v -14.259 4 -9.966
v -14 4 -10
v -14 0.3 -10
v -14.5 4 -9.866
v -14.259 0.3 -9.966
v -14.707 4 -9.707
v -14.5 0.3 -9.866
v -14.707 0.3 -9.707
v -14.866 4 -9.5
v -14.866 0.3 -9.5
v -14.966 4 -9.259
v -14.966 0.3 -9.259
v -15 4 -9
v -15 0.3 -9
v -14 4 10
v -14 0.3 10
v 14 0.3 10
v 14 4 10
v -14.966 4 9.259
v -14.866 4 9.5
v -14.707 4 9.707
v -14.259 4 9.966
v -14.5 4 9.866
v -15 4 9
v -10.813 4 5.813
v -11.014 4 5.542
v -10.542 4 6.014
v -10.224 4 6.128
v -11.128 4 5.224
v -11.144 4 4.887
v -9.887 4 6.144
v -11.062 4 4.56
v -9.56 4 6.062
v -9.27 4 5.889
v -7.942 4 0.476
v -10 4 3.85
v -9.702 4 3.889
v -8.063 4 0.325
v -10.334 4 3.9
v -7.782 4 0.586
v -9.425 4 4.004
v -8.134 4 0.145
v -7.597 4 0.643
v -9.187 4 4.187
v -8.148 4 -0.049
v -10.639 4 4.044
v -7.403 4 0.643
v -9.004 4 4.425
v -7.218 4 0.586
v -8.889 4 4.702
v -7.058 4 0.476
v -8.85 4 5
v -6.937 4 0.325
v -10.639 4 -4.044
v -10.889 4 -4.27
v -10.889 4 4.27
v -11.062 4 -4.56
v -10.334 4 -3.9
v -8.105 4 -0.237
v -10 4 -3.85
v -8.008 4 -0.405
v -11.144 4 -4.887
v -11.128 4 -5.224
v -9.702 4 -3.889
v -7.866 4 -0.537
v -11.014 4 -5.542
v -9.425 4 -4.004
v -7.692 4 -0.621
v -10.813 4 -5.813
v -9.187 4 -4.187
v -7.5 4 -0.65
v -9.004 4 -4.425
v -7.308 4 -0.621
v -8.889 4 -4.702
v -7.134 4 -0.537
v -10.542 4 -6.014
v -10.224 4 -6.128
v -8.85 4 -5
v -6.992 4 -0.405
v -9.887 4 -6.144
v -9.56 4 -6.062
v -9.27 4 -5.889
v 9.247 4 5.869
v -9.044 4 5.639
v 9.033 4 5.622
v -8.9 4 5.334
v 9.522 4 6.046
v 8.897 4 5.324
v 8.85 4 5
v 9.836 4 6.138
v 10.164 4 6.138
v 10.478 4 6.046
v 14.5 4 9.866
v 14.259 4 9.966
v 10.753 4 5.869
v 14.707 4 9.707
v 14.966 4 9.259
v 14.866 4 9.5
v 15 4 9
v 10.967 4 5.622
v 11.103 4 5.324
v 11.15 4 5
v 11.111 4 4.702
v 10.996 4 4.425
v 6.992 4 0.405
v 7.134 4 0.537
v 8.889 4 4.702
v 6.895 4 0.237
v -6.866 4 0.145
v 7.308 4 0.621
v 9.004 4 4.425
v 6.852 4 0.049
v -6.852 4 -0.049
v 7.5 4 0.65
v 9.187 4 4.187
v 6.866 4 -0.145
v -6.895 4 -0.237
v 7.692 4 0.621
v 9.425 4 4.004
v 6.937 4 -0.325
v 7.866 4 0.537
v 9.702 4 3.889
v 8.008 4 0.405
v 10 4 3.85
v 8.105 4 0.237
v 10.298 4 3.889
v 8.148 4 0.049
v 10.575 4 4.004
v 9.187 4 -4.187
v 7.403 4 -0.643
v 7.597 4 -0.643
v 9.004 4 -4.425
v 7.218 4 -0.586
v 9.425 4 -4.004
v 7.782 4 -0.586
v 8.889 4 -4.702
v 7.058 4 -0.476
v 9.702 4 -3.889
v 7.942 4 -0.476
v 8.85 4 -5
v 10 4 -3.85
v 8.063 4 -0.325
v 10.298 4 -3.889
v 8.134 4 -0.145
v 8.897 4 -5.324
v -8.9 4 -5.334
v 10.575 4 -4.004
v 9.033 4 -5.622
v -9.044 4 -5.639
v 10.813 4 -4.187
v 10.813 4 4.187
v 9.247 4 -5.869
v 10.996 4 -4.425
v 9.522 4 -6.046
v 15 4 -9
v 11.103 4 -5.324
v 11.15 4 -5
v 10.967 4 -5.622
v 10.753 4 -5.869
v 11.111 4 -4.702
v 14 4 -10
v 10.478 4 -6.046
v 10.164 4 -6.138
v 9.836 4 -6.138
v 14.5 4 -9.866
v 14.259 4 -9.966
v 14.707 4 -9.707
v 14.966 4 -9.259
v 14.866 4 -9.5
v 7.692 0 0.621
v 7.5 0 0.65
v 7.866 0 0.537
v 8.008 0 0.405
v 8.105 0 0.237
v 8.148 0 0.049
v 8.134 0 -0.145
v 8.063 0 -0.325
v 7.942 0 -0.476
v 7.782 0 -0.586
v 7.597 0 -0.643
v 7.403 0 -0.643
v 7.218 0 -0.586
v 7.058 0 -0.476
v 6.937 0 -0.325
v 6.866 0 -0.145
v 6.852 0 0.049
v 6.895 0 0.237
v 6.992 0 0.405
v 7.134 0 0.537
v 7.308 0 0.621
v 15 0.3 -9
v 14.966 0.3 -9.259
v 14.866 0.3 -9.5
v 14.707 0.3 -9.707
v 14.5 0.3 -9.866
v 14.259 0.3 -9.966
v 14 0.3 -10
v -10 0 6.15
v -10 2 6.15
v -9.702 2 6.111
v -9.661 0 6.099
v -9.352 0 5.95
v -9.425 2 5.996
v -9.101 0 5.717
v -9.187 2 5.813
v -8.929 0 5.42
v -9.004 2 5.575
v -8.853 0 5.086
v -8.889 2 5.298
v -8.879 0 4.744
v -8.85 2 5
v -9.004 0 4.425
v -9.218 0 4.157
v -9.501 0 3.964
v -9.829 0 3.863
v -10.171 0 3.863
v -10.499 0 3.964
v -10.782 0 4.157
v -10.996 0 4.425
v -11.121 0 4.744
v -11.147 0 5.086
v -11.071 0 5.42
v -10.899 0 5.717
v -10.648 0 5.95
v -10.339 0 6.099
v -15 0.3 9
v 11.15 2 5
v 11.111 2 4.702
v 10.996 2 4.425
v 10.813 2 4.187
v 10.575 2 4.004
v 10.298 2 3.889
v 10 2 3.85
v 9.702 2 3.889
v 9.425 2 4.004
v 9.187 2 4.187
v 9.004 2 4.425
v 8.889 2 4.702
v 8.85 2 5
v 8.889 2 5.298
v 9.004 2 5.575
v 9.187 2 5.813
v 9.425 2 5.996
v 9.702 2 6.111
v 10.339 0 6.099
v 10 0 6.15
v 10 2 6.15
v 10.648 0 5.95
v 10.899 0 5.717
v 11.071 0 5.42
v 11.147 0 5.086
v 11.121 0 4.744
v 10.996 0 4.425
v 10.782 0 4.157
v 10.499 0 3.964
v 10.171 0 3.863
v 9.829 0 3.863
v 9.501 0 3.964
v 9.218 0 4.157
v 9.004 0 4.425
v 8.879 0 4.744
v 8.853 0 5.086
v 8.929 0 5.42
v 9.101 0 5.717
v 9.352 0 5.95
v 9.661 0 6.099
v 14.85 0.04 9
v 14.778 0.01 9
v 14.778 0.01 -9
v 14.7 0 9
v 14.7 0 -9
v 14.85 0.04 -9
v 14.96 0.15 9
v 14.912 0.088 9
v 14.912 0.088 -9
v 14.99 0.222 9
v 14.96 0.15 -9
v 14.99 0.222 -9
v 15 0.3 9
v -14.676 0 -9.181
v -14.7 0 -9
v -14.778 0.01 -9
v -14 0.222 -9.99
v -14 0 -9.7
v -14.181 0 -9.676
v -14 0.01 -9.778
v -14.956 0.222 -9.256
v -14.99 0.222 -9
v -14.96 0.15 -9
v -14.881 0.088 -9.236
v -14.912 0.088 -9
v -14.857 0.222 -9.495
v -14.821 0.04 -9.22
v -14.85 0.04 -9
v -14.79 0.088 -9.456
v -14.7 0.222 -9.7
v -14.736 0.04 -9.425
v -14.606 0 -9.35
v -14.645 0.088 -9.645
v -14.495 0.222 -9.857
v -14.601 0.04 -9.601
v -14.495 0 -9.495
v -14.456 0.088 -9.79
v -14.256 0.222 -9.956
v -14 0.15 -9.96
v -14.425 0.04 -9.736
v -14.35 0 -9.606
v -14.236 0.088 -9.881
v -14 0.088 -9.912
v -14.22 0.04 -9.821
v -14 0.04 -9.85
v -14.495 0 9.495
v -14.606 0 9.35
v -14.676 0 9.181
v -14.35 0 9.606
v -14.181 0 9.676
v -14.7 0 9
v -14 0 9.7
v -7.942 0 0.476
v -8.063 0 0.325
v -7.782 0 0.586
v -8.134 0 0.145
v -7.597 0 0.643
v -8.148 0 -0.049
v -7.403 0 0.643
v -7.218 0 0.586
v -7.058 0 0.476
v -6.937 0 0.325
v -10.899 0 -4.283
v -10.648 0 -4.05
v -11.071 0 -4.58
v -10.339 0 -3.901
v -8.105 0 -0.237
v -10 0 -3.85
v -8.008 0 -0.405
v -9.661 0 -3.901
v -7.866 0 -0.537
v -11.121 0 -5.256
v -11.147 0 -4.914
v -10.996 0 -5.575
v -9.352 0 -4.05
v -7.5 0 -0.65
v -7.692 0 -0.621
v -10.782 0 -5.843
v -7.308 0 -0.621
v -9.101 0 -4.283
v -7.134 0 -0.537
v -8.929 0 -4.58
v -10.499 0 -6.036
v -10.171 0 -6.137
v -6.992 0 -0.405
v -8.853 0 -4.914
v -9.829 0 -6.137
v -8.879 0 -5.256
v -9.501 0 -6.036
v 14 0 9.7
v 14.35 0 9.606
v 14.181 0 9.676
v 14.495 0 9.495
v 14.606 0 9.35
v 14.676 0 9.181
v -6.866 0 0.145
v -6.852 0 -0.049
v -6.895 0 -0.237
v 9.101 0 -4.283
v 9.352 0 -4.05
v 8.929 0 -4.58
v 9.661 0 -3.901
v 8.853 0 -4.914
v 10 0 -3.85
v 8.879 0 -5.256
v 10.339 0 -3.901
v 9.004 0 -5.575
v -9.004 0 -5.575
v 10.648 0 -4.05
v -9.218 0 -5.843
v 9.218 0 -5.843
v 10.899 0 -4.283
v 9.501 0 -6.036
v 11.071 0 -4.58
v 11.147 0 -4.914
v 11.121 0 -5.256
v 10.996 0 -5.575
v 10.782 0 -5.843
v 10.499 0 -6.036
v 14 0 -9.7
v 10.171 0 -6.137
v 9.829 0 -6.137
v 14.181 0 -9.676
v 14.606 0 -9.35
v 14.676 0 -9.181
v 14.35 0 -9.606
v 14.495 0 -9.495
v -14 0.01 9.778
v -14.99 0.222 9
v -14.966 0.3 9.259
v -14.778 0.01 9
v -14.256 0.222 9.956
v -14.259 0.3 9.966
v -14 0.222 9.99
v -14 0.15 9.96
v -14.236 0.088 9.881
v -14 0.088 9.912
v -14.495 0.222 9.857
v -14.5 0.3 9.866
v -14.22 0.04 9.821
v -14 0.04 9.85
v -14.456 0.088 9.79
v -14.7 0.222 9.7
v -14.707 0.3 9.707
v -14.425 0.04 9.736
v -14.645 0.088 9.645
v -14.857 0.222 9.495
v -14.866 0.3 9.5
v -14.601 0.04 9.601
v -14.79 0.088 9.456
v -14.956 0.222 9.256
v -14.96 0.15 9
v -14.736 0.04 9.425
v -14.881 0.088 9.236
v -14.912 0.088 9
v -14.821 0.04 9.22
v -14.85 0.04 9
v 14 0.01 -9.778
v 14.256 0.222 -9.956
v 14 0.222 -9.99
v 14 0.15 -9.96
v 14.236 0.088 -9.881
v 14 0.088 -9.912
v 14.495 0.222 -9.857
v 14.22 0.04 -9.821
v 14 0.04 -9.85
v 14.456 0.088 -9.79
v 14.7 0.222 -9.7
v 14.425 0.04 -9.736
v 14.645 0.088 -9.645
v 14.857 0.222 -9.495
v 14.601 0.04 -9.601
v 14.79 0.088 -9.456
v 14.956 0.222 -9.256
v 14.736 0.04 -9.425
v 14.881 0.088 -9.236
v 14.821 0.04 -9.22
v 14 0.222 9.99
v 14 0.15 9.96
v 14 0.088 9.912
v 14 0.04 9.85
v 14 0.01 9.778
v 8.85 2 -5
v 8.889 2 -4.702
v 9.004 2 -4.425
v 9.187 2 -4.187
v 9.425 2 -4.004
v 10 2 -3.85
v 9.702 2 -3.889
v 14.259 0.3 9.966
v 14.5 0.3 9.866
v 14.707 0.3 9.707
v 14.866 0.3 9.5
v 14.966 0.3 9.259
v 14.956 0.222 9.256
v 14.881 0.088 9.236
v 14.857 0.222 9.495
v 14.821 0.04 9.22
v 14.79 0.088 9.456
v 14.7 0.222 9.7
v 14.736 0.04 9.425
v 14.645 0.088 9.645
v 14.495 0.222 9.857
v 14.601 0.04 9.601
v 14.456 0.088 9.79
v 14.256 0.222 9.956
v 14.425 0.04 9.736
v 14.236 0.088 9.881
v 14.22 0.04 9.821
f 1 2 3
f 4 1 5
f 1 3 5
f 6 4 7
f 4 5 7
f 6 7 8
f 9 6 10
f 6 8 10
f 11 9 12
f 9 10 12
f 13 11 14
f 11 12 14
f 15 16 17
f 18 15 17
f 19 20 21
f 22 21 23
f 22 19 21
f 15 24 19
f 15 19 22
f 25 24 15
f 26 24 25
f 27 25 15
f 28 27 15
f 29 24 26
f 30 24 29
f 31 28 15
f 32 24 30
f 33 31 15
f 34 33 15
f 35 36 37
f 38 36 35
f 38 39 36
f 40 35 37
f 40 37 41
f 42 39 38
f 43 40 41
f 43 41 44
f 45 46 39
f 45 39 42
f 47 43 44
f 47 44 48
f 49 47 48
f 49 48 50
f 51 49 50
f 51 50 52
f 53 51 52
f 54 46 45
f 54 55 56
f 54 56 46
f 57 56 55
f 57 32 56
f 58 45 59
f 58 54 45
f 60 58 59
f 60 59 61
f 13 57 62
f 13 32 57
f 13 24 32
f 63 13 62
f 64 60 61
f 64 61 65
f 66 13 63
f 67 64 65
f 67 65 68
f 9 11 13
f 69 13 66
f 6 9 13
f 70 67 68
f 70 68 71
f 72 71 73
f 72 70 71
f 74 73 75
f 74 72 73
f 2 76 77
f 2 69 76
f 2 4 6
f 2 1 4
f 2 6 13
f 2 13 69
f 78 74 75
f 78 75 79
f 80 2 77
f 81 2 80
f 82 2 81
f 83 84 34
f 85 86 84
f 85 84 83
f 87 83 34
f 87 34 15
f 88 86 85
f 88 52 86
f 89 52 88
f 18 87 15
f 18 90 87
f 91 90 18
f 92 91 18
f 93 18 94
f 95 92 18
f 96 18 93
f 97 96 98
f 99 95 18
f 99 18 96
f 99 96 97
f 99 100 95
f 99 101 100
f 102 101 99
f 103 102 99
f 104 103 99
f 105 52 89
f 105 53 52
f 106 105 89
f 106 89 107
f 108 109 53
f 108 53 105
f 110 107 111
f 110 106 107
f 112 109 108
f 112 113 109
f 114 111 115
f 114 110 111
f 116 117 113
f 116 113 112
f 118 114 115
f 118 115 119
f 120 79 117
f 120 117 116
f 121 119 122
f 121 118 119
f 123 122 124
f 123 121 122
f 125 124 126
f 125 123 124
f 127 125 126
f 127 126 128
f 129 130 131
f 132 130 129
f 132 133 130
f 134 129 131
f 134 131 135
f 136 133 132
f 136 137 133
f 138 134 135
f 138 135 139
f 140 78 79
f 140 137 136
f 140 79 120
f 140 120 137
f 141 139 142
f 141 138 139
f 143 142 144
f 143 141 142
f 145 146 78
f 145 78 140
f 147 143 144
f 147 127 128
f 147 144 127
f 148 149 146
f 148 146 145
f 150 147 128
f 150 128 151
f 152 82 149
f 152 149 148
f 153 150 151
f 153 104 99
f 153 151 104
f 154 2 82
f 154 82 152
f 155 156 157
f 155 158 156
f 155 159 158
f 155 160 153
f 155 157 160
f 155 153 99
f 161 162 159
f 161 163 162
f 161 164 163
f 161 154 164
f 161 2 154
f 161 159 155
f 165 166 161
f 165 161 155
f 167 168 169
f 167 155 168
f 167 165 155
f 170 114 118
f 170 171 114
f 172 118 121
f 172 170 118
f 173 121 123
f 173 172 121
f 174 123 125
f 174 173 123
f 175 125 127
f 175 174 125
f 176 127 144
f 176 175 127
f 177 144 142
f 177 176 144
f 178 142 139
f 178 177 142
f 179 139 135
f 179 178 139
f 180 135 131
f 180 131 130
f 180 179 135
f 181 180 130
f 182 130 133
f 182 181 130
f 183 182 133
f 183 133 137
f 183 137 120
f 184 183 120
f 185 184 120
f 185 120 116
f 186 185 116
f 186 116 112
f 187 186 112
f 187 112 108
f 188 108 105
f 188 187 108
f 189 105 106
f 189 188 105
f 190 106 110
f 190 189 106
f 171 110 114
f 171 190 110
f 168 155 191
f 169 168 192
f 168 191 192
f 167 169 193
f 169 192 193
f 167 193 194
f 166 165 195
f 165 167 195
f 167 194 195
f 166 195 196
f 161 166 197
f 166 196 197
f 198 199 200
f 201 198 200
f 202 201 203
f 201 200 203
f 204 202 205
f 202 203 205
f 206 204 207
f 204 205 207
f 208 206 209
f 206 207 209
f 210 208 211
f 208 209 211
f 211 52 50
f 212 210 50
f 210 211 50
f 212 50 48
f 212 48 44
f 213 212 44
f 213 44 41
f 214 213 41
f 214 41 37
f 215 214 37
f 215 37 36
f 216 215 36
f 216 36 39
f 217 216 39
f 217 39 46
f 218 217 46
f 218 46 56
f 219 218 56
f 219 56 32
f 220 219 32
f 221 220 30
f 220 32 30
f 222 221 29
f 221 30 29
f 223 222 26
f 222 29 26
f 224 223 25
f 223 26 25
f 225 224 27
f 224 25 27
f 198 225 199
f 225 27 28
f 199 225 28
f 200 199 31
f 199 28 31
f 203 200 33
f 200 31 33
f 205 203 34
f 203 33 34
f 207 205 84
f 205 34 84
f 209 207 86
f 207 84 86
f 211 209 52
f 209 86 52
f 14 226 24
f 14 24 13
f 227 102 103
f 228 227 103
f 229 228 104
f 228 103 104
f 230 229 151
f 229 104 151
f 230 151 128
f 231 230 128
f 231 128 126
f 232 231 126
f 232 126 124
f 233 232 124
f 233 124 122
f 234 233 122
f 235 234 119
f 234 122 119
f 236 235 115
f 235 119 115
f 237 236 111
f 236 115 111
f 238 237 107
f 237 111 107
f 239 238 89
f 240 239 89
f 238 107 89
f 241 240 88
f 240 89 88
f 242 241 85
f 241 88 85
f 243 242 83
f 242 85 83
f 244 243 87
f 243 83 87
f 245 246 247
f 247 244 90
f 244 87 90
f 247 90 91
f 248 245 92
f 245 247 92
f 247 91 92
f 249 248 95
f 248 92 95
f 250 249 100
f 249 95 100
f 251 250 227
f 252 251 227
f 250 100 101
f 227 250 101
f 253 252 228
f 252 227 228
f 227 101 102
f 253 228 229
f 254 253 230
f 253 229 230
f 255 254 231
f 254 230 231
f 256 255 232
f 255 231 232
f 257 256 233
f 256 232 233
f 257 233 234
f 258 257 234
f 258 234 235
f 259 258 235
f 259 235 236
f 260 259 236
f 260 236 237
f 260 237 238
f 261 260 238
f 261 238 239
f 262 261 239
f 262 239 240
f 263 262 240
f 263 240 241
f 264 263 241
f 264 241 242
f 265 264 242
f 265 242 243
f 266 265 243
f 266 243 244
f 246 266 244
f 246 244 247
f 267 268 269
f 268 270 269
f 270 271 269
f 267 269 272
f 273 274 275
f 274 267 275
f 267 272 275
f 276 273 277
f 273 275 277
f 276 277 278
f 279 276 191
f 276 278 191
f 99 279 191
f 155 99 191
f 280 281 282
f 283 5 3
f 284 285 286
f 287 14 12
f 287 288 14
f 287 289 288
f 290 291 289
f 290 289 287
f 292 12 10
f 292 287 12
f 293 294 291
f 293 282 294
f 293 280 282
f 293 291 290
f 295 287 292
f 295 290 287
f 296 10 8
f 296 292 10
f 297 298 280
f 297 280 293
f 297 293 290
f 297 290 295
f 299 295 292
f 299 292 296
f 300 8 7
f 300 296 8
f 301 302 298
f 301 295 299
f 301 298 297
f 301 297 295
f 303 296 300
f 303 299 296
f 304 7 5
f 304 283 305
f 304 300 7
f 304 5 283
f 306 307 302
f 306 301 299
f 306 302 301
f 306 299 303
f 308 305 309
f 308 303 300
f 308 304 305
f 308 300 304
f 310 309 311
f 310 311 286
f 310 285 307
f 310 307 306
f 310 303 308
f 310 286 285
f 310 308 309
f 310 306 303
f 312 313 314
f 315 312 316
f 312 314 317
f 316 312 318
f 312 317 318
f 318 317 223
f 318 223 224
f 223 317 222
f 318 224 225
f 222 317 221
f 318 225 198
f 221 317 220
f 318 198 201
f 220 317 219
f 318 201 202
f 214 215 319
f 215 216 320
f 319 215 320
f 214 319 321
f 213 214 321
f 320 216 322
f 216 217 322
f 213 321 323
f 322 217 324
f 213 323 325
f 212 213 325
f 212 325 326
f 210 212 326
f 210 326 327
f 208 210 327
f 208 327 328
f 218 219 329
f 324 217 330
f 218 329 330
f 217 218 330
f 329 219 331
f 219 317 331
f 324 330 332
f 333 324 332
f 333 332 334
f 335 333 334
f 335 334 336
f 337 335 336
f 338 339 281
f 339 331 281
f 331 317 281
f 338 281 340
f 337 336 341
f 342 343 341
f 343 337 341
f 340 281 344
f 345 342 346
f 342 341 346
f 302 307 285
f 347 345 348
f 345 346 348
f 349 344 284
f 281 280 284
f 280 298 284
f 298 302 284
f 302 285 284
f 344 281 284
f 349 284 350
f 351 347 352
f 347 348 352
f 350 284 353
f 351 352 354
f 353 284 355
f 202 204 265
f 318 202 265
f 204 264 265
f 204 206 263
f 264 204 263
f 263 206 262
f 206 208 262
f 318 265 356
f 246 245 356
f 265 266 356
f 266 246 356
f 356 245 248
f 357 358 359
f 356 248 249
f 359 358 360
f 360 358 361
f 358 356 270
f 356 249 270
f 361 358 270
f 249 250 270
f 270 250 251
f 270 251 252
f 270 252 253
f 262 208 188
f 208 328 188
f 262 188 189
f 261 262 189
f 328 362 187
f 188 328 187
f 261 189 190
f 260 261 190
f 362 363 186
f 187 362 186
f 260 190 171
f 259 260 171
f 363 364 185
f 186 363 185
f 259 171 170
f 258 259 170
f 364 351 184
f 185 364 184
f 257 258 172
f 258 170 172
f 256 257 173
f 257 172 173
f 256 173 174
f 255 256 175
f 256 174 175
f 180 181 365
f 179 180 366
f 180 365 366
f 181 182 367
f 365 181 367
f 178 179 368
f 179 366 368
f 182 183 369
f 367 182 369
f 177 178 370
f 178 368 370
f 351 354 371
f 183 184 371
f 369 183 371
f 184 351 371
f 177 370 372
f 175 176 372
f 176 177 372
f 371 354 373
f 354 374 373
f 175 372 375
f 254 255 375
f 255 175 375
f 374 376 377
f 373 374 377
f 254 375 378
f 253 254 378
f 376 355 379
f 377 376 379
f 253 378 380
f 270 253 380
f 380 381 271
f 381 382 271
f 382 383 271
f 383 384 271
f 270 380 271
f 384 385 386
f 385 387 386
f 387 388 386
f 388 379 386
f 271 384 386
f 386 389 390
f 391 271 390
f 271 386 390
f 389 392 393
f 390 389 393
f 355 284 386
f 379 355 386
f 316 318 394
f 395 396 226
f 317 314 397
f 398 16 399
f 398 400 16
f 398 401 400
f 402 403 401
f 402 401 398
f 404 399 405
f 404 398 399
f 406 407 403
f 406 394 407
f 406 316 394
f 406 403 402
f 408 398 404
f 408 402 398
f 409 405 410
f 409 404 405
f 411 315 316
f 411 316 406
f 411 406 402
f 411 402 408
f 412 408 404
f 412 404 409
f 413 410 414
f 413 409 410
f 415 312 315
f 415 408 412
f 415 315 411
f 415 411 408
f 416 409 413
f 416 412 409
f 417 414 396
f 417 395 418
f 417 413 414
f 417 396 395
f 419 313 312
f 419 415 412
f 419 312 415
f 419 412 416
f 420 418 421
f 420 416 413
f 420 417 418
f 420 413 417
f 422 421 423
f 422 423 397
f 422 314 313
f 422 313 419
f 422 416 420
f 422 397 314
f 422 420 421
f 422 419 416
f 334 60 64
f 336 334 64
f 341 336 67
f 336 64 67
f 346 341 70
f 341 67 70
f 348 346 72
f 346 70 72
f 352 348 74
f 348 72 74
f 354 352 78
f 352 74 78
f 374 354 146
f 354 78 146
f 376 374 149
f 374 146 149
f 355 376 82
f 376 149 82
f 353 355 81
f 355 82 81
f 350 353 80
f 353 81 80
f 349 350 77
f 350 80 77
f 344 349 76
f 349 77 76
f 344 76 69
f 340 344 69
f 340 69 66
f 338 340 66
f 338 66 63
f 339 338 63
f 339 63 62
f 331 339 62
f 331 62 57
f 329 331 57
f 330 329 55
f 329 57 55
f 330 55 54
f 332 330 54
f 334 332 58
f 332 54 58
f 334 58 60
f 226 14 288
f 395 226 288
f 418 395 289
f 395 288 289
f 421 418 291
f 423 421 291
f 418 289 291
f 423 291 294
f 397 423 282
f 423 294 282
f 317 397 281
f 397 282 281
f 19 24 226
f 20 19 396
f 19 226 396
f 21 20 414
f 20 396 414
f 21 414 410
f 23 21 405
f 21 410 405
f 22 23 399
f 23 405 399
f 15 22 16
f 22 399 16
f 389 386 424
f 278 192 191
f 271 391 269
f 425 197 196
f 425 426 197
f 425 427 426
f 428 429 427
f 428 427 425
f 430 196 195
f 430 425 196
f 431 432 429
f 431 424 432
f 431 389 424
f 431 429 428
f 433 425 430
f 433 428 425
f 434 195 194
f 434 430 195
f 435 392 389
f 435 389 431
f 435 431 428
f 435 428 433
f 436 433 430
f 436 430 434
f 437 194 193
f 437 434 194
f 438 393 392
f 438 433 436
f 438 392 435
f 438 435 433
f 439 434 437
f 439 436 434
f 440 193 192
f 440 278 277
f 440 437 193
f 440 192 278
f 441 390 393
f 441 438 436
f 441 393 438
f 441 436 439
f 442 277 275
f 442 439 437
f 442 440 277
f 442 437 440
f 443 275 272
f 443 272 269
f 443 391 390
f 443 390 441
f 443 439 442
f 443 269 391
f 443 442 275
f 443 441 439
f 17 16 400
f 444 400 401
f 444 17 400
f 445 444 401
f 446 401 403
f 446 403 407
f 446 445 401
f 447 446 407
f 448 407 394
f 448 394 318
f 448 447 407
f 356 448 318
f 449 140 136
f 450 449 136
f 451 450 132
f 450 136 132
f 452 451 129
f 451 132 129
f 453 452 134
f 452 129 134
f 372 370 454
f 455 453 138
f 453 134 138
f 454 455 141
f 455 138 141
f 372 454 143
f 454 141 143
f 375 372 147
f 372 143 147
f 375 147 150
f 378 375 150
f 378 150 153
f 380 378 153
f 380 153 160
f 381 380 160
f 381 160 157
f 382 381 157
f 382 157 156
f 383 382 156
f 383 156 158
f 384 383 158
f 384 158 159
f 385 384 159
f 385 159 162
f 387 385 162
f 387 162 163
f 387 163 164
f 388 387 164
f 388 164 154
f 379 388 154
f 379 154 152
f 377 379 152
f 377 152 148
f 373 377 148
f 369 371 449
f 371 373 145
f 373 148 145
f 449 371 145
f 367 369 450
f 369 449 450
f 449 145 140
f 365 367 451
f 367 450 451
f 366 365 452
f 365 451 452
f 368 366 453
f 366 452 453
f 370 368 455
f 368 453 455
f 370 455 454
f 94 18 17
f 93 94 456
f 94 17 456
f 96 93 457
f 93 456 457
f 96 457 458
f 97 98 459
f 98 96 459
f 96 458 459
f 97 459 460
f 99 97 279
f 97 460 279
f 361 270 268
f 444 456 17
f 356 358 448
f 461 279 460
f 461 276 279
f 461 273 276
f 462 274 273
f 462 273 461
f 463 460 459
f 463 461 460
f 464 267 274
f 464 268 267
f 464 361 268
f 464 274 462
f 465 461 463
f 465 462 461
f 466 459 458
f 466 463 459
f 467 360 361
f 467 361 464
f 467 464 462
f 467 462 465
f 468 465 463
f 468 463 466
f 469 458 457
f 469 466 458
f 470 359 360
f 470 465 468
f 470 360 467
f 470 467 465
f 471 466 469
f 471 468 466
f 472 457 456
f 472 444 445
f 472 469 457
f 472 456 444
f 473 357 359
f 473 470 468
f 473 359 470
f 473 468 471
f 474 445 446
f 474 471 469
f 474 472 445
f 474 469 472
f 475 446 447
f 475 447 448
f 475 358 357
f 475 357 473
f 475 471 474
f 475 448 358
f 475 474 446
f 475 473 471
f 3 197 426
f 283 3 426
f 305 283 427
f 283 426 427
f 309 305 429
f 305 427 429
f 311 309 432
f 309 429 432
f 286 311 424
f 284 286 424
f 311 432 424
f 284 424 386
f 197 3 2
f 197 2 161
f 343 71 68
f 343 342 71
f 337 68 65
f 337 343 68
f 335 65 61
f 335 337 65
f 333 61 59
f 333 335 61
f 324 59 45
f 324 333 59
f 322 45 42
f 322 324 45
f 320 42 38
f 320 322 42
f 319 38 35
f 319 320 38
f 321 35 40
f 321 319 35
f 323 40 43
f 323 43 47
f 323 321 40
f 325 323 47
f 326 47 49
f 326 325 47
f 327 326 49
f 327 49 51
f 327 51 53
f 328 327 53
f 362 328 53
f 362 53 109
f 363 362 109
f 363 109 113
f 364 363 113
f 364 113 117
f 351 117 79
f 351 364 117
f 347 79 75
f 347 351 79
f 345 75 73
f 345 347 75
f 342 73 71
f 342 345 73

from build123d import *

# Parameters (mm, degrees)
SKETCH3_W           = 30
SKETCH3_H           = 20
SKETCH3_R           = 0.65
BOSS_EXTRUDE5_DEPTH = 4
CUT_EXTRUDE1_DEPTH  = 2
FILLET1_R           = 0.3
FILLET2_R           = 1
SKETCH10_R          = 1.15
SKETCH10_R_2        = 0.65
CUT_EXTRUDE3_DEPTH  = 10
FILLET3_R           = 1


with BuildPart() as part:
    # Sketch3 → Boss-Extrude5 (new body)
    with BuildSketch(Plane(origin=(0, 0, 0), x_dir=(1, 0, 0), z_dir=(0, 1, 0))):
        Rectangle(SKETCH3_W, SKETCH3_H)
        with Locations(Location((7.5, 0, 0), (0, 0, 270))):
            Circle(SKETCH3_R, mode=Mode.SUBTRACT)
        with Locations(Location((-7.5, 0, 0), (0, 0, 90))):
            Circle(SKETCH3_R, mode=Mode.SUBTRACT)
    extrude(amount=BOSS_EXTRUDE5_DEPTH)

    # Sketch6 → Cut-Extrude1 (cut)
    with BuildSketch(Plane(origin=(0, 4, 0), x_dir=(1, 0, 0), z_dir=(0, 1, 0))):
        with BuildLine():
            Line((-8.85, 5), (-10, 5))
            Line((-10, 5), (-10, 3.85))
            ThreePointArc((-10, 3.85), (-9.186827202, 4.186827202), (-8.85, 5))
        make_face()
        with BuildLine():
            Line((-10, 3.85), (-10, 5))
            Line((-10, 5), (-8.85, 5))
            ThreePointArc((-8.85, 5), (-10.813172798, 5.813172798), (-10, 3.85))
        make_face()
        with BuildLine():
            ThreePointArc((11.15, 5), (10, 6.15), (8.85, 5))
            Line((8.85, 5), (10, 5))
            Line((10, 5), (10, 3.85))
            ThreePointArc((10, 3.85), (10.813172798, 4.186827202), (11.15, 5))
        make_face()
        with BuildLine():
            Line((10, 5), (8.85, 5))
            ThreePointArc((8.85, 5), (9.186827202, 4.186827202), (10, 3.85))
            Line((10, 3.85), (10, 5))
        make_face()
        with BuildLine():
            ThreePointArc((10, -3.85), (9.186827202, -4.186827202), (8.85, -5))
            Line((8.85, -5), (10, -5))
            Line((10, -5), (10, -3.85))
        make_face()
        with BuildLine():
            Line((10, -5), (8.85, -5))
            ThreePointArc((8.85, -5), (10, -6.15), (11.15, -5))
            ThreePointArc((11.15, -5), (10.813172798, -4.186827202), (10, -3.85))
            Line((10, -3.85), (10, -5))
        make_face()
        with BuildLine():
            ThreePointArc((-8.85, -5), (-9.186827202, -4.186827202), (-10, -3.85))
            Line((-10, -3.85), (-10, -5))
            Line((-10, -5), (-8.85, -5))
        make_face()
        with BuildLine():
            Line((-10, -5), (-10, -3.85))
            ThreePointArc((-10, -3.85), (-10.813172798, -5.813172798), (-8.85, -5))
            Line((-8.85, -5), (-10, -5))
        make_face()
    extrude(amount=-CUT_EXTRUDE1_DEPTH, mode=Mode.SUBTRACT)

    # Fillet1
    fillet1_edges = [part.edges().sort_by_distance(p)[0] for p in [
        (0, 0, 10),
        (-15, 0, 0),
        (0, 0, -10),
        (15, 0, 0),
    ]]
    fillet(fillet1_edges, radius=FILLET1_R)

    # Fillet2
    # the kernel refuses this fillet: 1 mm, written as the material it takes off along each edge
    with BuildSketch(Plane(origin=(14, 0, 9), x_dir=(1, 0, 0), z_dir=(0, 0, -1))) as fillet2_piece_1:
        with BuildLine():
            CenterArc((0.7, -0.3), 0.3, 0, 90)
            Line((1, -0.3), (1, 0))
            Line((1, 0), (0.7, 0))
        make_face()
    revolve(axis=Axis((14, 0, 9), (0, -1, 0)), revolution_arc=90, mode=Mode.SUBTRACT)
    with BuildSketch(Plane(origin=(14, 0, -9), x_dir=(0, 0, -1), z_dir=(-1, 0, 0))) as fillet2_piece_2:
        with BuildLine():
            CenterArc((0.7, -0.3), 0.3, 0, 90)
            Line((1, -0.3), (1, 0))
            Line((1, 0), (0.7, 0))
        make_face()
    revolve(axis=Axis((14, 0, -9), (0, -1, 0)), revolution_arc=90, mode=Mode.SUBTRACT)
    with BuildSketch(Plane(origin=(15, 0, 10), x_dir=(-1, 0, 0), z_dir=(0, 1, 0)), Plane(origin=(15, 0, -10), x_dir=(0, 0, 1), z_dir=(0, 1, 0))) as fillet2_piece_3:
        with BuildLine():
            CenterArc((FILLET2_R, -FILLET2_R), FILLET2_R, 90, 90)
            Line((0, -FILLET2_R), (0, 0))
            Line((0, 0), (FILLET2_R, 0))
        make_face()
    extrude(amount=6.5, mode=Mode.SUBTRACT)

    # Sketch10 → Cut-Extrude3 (cut)
    with BuildSketch(Plane(origin=(0, 2, 0), x_dir=(1, 0, 0), z_dir=(0, 1, 0))):
        with Locations(Location((10, -5, 0), (0, 0, 270))):
            Circle(SKETCH10_R)
        with Locations(Location((-7.5, 0, 0), (0, 0, 90))):
            Circle(SKETCH10_R_2)
        with Locations(Location((-10, 5, 0), (0, 0, 270))):
            Circle(SKETCH10_R)
        with Locations(Location((7.5, 0, 0), (0, 0, 270))):
            Circle(SKETCH10_R_2)
        with Locations(Location((10, 5, 0), (0, 0, 270))):
            Circle(SKETCH10_R)
        with Locations(Location((-10, -5, 0), (0, 0, 270))):
            Circle(SKETCH10_R)
    extrude(amount=-CUT_EXTRUDE3_DEPTH, mode=Mode.SUBTRACT)

    # Fillet3
    # the kernel refuses this fillet: 1 mm, written as the material it takes off along each edge
    with BuildSketch(Plane(origin=(-14, 0, 9), x_dir=(0, 0, 1), z_dir=(1, 0, 0))) as fillet3_piece_1:
        with BuildLine():
            CenterArc((0.7, -0.3), 0.3, 0, 90)
            Line((1, -0.3), (1, 0))
            Line((1, 0), (0.7, 0))
        make_face()
    revolve(axis=Axis((-14, 0, 9), (0, -1, 0)), revolution_arc=90, mode=Mode.SUBTRACT)
    with BuildSketch(Plane(origin=(-14, 0, -9), x_dir=(-1, 0, 0), z_dir=(0, 0, 1))) as fillet3_piece_2:
        with BuildLine():
            CenterArc((0.7, -0.3), 0.3, 0, 90)
            Line((1, -0.3), (1, 0))
            Line((1, 0), (0.7, 0))
        make_face()
    revolve(axis=Axis((-14, 0, -9), (0, -1, 0)), revolution_arc=90, mode=Mode.SUBTRACT)
    with BuildSketch(Plane(origin=(-15, 0, 10), x_dir=(1, 0, 0), z_dir=(0, 1, 0)), Plane(origin=(-15, 0, -10), x_dir=(0, 0, 1), z_dir=(0, 1, 0))) as fillet3_piece_3:
        with BuildLine():
            CenterArc((FILLET3_R, FILLET3_R), FILLET3_R, 180, 90)
            Line((0, FILLET3_R), (0, 0))
            Line((0, 0), (FILLET3_R, 0))
        make_face()
    extrude(amount=6.5, mode=Mode.SUBTRACT)


solid = part.part
